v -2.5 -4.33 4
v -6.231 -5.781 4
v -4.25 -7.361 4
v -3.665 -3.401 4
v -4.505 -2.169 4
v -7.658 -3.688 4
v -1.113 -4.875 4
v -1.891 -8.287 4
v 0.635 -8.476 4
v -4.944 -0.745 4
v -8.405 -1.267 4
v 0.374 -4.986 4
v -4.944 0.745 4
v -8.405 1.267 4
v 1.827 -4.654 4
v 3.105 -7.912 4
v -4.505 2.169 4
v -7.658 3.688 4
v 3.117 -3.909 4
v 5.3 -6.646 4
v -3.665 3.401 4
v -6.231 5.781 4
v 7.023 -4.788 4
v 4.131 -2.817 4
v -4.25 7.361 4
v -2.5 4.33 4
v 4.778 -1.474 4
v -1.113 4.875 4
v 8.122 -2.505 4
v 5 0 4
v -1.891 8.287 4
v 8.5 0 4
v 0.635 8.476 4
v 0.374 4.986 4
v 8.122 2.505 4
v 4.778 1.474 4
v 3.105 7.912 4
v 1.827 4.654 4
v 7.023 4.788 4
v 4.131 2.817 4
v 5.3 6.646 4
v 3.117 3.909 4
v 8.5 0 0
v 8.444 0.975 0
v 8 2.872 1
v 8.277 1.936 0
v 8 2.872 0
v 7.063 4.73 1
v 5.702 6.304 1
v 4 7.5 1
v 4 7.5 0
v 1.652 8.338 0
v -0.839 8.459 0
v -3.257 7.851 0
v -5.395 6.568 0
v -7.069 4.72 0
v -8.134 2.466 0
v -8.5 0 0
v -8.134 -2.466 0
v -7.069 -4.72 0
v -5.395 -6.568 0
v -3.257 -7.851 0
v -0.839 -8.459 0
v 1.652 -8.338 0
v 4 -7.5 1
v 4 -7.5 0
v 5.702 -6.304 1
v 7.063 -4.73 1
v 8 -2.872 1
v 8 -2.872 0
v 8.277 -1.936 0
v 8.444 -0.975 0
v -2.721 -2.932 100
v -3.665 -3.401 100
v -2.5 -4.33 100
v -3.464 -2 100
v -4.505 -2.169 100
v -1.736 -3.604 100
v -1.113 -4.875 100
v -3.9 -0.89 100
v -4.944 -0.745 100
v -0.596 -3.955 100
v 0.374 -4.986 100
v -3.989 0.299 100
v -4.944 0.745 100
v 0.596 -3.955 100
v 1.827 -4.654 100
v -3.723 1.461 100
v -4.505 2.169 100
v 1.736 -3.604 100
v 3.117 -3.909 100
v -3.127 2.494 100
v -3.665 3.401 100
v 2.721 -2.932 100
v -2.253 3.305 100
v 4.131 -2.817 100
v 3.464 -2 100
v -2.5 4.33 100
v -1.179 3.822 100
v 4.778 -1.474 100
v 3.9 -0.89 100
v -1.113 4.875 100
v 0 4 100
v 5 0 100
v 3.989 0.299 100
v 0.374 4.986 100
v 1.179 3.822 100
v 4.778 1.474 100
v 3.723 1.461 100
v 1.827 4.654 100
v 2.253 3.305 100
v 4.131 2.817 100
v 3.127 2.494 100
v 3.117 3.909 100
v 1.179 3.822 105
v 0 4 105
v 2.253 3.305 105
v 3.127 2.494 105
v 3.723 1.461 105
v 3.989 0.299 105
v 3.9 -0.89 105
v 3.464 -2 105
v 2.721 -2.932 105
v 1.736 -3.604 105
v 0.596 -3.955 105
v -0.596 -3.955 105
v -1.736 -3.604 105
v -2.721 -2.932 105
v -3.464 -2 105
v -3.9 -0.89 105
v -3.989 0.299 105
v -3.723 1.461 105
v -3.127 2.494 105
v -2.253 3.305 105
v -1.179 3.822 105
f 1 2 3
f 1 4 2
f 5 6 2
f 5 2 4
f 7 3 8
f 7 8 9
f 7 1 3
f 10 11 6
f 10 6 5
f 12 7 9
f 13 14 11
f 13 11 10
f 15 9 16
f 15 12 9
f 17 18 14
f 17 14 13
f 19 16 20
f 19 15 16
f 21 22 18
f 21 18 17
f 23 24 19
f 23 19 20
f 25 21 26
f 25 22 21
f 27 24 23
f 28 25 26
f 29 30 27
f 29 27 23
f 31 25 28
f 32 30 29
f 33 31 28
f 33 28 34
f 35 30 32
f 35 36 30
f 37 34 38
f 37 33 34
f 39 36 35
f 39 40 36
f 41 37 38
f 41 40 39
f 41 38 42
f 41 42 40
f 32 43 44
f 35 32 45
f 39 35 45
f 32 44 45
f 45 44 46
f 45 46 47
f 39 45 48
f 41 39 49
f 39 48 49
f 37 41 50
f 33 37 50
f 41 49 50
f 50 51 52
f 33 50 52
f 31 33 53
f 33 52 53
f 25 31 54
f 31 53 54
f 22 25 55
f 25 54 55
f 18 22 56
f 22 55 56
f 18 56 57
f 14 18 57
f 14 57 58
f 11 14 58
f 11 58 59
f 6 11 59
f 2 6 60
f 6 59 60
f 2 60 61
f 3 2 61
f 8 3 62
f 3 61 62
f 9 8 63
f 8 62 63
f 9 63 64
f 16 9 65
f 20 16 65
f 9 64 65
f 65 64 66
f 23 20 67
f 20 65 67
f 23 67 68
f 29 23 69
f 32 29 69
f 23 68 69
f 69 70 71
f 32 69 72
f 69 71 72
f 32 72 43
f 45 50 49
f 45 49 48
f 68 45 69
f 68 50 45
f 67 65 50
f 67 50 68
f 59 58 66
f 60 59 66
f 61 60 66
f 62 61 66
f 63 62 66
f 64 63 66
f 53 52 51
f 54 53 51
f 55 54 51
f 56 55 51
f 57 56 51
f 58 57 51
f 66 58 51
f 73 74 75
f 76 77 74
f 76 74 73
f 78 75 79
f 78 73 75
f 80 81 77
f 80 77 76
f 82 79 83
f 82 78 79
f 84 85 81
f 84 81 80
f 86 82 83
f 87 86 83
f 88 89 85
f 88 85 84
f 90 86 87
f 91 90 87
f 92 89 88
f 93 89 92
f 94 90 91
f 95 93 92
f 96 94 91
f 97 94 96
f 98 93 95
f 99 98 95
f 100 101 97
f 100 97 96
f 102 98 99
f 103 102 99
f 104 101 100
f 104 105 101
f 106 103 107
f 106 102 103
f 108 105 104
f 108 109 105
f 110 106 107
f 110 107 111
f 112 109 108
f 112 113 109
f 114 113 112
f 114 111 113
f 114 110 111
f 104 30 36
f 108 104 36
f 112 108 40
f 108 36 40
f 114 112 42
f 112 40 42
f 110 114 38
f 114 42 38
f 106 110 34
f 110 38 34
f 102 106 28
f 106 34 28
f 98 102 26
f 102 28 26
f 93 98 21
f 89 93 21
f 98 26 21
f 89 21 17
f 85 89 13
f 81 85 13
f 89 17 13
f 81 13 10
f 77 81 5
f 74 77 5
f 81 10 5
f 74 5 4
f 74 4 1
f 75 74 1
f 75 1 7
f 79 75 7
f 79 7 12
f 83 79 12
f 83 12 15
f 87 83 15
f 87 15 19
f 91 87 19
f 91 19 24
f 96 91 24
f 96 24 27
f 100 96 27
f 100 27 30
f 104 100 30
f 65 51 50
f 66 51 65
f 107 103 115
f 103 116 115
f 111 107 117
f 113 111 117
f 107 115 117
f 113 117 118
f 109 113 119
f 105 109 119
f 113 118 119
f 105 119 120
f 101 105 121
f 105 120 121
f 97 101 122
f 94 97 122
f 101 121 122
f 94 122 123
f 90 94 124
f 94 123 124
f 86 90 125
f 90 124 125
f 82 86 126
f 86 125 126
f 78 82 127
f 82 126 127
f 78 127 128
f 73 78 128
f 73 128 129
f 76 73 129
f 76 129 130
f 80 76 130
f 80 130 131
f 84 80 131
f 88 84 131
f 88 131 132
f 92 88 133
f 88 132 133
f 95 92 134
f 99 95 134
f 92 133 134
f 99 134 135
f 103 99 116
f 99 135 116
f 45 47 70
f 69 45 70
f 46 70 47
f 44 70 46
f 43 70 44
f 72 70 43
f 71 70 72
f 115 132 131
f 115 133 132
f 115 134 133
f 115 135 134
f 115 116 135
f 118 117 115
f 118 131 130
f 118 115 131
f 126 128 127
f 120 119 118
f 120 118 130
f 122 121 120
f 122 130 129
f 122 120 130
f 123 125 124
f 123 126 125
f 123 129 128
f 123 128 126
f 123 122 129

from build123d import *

# Parameters (mm, degrees)
F0_R     = 8.5
F1_DEPTH = 4
F2_R     = 5
F3_DEPTH = 100
F4_W     = 4
F4_H     = 5
F6_W     = 4
F6_H     = 36.891641
F7_DEPTH = 1


with BuildPart() as f1:
    # F0 (on Top) → F1 (new body)
    with BuildSketch(Plane.XY):
        Circle(F0_R)
    extrude(amount=F1_DEPTH)

    # F2 (on Top) → F3 (join)
    with BuildSketch(Plane.XY):
        Circle(F2_R)
    extrude(amount=F3_DEPTH)

    # F4 (on Right) → F5 (revolve)
    with BuildSketch(Plane.YZ):
        with Locations((2, 102.5)):
            Rectangle(F4_W, F4_H)
    revolve(axis=Axis((0, 0, 102.5), (0, 0, -1)))

    # F6 (on face) → F7 (cut)
    with BuildSketch(Plane(origin=(0, 0, 0), x_dir=(1, 0, 0), z_dir=(0, 0, -1))):
        with Locations((6, -0.745802)):
            Rectangle(F6_W, F6_H)
    extrude(amount=-F7_DEPTH, mode=Mode.SUBTRACT)


solid = f1.part
